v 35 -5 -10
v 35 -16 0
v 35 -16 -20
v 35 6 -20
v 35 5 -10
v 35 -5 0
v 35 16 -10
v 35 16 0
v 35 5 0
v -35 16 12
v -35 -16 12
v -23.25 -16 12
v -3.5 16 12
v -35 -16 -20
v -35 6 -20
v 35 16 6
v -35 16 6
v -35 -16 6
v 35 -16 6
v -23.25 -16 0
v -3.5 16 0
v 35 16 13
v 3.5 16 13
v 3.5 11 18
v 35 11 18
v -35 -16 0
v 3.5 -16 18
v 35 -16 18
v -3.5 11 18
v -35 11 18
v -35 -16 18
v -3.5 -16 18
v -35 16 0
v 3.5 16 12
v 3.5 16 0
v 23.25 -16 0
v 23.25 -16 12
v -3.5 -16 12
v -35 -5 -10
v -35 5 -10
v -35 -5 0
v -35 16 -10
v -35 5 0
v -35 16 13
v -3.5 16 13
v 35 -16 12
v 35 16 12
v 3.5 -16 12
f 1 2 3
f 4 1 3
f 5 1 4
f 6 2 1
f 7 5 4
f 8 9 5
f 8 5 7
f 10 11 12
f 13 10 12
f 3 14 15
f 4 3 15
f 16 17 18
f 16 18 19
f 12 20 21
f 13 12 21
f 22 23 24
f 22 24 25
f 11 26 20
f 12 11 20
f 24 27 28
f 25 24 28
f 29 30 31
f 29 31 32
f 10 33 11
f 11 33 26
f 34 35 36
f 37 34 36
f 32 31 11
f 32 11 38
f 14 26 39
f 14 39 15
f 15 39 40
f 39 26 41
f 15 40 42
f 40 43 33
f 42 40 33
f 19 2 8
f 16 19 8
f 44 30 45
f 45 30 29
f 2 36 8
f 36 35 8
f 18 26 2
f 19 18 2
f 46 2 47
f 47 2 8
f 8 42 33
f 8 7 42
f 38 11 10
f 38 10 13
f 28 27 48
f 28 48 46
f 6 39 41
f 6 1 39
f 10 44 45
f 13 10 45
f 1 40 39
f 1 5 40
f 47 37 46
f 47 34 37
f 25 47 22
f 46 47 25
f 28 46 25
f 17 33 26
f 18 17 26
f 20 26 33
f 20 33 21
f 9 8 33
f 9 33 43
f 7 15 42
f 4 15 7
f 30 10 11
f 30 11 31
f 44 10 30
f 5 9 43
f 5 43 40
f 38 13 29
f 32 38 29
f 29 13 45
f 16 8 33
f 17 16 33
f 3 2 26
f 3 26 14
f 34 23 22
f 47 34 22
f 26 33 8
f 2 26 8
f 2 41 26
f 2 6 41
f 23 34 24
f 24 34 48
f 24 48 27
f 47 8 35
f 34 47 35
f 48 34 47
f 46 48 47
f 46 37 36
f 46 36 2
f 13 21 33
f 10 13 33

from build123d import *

# Parameters (mm, degrees)
F1_DEPTH = 12
F2_DEPTH = 6
F3_W     = 31.5
F3_H     = 6
F4_DEPTH = 16
F5_SIZE  = 5
F7_DEPTH = 35
F8_SIZE  = 10


with BuildPart() as f1:
    # F0 (on Top) → F1 (new body)
    with BuildSketch(Plane.XY):
        Polygon((-35, -16), (-23.25, -16), (-3.5, 16), (-35, 16), align=None)
        Polygon((23.25, -16), (35, -16), (35, 16), (3.5, 16), align=None)
    extrude(amount=F1_DEPTH)


with BuildPart() as f2:
    # F0 (on Top) → F2 (new body)
    with BuildSketch(Plane.XY):
        Polygon((23.25, -16), (35, -16), (35, 16), (3.5, 16), align=None)
        Polygon((-23.25, -16), (23.25, -16), (3.5, 16), (-3.5, 16), align=None)
        Polygon((-35, -16), (-23.25, -16), (-3.5, 16), (-35, 16), align=None)
    extrude(amount=F2_DEPTH)


with BuildPart() as f4:
    # F3 (on Front) → F4 (new body, symmetric)
    with BuildSketch(Plane.XZ):
        with Locations((-19.25, 15)):
            Rectangle(F3_W, F3_H)
        with Locations((19.25, 15)):
            Rectangle(F3_W, F3_H)
    extrude(amount=F4_DEPTH, both=True)

    # F5
    f5_edges = [f4.edges().sort_by_distance(p)[0] for p in [
        (-19.25, 16, 18),
        (19.25, 16, 18),
    ]]
    chamfer(f5_edges, length=F5_SIZE)


with BuildPart() as f7:
    # F6 (on Right) → F7 (new body, symmetric)
    with BuildSketch(Plane.YZ):
        Polygon((-5, 0), (-16, 0), (-16, -20), (16, -20), (16, 0), (5, 0), (5, -10), (-5, -10), align=None)
    extrude(amount=F7_DEPTH, both=True)

    # F8
    f8_edges = [f7.edges().sort_by_distance(p)[0] for p in [
        (0, 16, -20),
    ]]
    chamfer(f8_edges, length=F8_SIZE)


solid = Compound([f1.part, f2.part, f4.part, f7.part])
